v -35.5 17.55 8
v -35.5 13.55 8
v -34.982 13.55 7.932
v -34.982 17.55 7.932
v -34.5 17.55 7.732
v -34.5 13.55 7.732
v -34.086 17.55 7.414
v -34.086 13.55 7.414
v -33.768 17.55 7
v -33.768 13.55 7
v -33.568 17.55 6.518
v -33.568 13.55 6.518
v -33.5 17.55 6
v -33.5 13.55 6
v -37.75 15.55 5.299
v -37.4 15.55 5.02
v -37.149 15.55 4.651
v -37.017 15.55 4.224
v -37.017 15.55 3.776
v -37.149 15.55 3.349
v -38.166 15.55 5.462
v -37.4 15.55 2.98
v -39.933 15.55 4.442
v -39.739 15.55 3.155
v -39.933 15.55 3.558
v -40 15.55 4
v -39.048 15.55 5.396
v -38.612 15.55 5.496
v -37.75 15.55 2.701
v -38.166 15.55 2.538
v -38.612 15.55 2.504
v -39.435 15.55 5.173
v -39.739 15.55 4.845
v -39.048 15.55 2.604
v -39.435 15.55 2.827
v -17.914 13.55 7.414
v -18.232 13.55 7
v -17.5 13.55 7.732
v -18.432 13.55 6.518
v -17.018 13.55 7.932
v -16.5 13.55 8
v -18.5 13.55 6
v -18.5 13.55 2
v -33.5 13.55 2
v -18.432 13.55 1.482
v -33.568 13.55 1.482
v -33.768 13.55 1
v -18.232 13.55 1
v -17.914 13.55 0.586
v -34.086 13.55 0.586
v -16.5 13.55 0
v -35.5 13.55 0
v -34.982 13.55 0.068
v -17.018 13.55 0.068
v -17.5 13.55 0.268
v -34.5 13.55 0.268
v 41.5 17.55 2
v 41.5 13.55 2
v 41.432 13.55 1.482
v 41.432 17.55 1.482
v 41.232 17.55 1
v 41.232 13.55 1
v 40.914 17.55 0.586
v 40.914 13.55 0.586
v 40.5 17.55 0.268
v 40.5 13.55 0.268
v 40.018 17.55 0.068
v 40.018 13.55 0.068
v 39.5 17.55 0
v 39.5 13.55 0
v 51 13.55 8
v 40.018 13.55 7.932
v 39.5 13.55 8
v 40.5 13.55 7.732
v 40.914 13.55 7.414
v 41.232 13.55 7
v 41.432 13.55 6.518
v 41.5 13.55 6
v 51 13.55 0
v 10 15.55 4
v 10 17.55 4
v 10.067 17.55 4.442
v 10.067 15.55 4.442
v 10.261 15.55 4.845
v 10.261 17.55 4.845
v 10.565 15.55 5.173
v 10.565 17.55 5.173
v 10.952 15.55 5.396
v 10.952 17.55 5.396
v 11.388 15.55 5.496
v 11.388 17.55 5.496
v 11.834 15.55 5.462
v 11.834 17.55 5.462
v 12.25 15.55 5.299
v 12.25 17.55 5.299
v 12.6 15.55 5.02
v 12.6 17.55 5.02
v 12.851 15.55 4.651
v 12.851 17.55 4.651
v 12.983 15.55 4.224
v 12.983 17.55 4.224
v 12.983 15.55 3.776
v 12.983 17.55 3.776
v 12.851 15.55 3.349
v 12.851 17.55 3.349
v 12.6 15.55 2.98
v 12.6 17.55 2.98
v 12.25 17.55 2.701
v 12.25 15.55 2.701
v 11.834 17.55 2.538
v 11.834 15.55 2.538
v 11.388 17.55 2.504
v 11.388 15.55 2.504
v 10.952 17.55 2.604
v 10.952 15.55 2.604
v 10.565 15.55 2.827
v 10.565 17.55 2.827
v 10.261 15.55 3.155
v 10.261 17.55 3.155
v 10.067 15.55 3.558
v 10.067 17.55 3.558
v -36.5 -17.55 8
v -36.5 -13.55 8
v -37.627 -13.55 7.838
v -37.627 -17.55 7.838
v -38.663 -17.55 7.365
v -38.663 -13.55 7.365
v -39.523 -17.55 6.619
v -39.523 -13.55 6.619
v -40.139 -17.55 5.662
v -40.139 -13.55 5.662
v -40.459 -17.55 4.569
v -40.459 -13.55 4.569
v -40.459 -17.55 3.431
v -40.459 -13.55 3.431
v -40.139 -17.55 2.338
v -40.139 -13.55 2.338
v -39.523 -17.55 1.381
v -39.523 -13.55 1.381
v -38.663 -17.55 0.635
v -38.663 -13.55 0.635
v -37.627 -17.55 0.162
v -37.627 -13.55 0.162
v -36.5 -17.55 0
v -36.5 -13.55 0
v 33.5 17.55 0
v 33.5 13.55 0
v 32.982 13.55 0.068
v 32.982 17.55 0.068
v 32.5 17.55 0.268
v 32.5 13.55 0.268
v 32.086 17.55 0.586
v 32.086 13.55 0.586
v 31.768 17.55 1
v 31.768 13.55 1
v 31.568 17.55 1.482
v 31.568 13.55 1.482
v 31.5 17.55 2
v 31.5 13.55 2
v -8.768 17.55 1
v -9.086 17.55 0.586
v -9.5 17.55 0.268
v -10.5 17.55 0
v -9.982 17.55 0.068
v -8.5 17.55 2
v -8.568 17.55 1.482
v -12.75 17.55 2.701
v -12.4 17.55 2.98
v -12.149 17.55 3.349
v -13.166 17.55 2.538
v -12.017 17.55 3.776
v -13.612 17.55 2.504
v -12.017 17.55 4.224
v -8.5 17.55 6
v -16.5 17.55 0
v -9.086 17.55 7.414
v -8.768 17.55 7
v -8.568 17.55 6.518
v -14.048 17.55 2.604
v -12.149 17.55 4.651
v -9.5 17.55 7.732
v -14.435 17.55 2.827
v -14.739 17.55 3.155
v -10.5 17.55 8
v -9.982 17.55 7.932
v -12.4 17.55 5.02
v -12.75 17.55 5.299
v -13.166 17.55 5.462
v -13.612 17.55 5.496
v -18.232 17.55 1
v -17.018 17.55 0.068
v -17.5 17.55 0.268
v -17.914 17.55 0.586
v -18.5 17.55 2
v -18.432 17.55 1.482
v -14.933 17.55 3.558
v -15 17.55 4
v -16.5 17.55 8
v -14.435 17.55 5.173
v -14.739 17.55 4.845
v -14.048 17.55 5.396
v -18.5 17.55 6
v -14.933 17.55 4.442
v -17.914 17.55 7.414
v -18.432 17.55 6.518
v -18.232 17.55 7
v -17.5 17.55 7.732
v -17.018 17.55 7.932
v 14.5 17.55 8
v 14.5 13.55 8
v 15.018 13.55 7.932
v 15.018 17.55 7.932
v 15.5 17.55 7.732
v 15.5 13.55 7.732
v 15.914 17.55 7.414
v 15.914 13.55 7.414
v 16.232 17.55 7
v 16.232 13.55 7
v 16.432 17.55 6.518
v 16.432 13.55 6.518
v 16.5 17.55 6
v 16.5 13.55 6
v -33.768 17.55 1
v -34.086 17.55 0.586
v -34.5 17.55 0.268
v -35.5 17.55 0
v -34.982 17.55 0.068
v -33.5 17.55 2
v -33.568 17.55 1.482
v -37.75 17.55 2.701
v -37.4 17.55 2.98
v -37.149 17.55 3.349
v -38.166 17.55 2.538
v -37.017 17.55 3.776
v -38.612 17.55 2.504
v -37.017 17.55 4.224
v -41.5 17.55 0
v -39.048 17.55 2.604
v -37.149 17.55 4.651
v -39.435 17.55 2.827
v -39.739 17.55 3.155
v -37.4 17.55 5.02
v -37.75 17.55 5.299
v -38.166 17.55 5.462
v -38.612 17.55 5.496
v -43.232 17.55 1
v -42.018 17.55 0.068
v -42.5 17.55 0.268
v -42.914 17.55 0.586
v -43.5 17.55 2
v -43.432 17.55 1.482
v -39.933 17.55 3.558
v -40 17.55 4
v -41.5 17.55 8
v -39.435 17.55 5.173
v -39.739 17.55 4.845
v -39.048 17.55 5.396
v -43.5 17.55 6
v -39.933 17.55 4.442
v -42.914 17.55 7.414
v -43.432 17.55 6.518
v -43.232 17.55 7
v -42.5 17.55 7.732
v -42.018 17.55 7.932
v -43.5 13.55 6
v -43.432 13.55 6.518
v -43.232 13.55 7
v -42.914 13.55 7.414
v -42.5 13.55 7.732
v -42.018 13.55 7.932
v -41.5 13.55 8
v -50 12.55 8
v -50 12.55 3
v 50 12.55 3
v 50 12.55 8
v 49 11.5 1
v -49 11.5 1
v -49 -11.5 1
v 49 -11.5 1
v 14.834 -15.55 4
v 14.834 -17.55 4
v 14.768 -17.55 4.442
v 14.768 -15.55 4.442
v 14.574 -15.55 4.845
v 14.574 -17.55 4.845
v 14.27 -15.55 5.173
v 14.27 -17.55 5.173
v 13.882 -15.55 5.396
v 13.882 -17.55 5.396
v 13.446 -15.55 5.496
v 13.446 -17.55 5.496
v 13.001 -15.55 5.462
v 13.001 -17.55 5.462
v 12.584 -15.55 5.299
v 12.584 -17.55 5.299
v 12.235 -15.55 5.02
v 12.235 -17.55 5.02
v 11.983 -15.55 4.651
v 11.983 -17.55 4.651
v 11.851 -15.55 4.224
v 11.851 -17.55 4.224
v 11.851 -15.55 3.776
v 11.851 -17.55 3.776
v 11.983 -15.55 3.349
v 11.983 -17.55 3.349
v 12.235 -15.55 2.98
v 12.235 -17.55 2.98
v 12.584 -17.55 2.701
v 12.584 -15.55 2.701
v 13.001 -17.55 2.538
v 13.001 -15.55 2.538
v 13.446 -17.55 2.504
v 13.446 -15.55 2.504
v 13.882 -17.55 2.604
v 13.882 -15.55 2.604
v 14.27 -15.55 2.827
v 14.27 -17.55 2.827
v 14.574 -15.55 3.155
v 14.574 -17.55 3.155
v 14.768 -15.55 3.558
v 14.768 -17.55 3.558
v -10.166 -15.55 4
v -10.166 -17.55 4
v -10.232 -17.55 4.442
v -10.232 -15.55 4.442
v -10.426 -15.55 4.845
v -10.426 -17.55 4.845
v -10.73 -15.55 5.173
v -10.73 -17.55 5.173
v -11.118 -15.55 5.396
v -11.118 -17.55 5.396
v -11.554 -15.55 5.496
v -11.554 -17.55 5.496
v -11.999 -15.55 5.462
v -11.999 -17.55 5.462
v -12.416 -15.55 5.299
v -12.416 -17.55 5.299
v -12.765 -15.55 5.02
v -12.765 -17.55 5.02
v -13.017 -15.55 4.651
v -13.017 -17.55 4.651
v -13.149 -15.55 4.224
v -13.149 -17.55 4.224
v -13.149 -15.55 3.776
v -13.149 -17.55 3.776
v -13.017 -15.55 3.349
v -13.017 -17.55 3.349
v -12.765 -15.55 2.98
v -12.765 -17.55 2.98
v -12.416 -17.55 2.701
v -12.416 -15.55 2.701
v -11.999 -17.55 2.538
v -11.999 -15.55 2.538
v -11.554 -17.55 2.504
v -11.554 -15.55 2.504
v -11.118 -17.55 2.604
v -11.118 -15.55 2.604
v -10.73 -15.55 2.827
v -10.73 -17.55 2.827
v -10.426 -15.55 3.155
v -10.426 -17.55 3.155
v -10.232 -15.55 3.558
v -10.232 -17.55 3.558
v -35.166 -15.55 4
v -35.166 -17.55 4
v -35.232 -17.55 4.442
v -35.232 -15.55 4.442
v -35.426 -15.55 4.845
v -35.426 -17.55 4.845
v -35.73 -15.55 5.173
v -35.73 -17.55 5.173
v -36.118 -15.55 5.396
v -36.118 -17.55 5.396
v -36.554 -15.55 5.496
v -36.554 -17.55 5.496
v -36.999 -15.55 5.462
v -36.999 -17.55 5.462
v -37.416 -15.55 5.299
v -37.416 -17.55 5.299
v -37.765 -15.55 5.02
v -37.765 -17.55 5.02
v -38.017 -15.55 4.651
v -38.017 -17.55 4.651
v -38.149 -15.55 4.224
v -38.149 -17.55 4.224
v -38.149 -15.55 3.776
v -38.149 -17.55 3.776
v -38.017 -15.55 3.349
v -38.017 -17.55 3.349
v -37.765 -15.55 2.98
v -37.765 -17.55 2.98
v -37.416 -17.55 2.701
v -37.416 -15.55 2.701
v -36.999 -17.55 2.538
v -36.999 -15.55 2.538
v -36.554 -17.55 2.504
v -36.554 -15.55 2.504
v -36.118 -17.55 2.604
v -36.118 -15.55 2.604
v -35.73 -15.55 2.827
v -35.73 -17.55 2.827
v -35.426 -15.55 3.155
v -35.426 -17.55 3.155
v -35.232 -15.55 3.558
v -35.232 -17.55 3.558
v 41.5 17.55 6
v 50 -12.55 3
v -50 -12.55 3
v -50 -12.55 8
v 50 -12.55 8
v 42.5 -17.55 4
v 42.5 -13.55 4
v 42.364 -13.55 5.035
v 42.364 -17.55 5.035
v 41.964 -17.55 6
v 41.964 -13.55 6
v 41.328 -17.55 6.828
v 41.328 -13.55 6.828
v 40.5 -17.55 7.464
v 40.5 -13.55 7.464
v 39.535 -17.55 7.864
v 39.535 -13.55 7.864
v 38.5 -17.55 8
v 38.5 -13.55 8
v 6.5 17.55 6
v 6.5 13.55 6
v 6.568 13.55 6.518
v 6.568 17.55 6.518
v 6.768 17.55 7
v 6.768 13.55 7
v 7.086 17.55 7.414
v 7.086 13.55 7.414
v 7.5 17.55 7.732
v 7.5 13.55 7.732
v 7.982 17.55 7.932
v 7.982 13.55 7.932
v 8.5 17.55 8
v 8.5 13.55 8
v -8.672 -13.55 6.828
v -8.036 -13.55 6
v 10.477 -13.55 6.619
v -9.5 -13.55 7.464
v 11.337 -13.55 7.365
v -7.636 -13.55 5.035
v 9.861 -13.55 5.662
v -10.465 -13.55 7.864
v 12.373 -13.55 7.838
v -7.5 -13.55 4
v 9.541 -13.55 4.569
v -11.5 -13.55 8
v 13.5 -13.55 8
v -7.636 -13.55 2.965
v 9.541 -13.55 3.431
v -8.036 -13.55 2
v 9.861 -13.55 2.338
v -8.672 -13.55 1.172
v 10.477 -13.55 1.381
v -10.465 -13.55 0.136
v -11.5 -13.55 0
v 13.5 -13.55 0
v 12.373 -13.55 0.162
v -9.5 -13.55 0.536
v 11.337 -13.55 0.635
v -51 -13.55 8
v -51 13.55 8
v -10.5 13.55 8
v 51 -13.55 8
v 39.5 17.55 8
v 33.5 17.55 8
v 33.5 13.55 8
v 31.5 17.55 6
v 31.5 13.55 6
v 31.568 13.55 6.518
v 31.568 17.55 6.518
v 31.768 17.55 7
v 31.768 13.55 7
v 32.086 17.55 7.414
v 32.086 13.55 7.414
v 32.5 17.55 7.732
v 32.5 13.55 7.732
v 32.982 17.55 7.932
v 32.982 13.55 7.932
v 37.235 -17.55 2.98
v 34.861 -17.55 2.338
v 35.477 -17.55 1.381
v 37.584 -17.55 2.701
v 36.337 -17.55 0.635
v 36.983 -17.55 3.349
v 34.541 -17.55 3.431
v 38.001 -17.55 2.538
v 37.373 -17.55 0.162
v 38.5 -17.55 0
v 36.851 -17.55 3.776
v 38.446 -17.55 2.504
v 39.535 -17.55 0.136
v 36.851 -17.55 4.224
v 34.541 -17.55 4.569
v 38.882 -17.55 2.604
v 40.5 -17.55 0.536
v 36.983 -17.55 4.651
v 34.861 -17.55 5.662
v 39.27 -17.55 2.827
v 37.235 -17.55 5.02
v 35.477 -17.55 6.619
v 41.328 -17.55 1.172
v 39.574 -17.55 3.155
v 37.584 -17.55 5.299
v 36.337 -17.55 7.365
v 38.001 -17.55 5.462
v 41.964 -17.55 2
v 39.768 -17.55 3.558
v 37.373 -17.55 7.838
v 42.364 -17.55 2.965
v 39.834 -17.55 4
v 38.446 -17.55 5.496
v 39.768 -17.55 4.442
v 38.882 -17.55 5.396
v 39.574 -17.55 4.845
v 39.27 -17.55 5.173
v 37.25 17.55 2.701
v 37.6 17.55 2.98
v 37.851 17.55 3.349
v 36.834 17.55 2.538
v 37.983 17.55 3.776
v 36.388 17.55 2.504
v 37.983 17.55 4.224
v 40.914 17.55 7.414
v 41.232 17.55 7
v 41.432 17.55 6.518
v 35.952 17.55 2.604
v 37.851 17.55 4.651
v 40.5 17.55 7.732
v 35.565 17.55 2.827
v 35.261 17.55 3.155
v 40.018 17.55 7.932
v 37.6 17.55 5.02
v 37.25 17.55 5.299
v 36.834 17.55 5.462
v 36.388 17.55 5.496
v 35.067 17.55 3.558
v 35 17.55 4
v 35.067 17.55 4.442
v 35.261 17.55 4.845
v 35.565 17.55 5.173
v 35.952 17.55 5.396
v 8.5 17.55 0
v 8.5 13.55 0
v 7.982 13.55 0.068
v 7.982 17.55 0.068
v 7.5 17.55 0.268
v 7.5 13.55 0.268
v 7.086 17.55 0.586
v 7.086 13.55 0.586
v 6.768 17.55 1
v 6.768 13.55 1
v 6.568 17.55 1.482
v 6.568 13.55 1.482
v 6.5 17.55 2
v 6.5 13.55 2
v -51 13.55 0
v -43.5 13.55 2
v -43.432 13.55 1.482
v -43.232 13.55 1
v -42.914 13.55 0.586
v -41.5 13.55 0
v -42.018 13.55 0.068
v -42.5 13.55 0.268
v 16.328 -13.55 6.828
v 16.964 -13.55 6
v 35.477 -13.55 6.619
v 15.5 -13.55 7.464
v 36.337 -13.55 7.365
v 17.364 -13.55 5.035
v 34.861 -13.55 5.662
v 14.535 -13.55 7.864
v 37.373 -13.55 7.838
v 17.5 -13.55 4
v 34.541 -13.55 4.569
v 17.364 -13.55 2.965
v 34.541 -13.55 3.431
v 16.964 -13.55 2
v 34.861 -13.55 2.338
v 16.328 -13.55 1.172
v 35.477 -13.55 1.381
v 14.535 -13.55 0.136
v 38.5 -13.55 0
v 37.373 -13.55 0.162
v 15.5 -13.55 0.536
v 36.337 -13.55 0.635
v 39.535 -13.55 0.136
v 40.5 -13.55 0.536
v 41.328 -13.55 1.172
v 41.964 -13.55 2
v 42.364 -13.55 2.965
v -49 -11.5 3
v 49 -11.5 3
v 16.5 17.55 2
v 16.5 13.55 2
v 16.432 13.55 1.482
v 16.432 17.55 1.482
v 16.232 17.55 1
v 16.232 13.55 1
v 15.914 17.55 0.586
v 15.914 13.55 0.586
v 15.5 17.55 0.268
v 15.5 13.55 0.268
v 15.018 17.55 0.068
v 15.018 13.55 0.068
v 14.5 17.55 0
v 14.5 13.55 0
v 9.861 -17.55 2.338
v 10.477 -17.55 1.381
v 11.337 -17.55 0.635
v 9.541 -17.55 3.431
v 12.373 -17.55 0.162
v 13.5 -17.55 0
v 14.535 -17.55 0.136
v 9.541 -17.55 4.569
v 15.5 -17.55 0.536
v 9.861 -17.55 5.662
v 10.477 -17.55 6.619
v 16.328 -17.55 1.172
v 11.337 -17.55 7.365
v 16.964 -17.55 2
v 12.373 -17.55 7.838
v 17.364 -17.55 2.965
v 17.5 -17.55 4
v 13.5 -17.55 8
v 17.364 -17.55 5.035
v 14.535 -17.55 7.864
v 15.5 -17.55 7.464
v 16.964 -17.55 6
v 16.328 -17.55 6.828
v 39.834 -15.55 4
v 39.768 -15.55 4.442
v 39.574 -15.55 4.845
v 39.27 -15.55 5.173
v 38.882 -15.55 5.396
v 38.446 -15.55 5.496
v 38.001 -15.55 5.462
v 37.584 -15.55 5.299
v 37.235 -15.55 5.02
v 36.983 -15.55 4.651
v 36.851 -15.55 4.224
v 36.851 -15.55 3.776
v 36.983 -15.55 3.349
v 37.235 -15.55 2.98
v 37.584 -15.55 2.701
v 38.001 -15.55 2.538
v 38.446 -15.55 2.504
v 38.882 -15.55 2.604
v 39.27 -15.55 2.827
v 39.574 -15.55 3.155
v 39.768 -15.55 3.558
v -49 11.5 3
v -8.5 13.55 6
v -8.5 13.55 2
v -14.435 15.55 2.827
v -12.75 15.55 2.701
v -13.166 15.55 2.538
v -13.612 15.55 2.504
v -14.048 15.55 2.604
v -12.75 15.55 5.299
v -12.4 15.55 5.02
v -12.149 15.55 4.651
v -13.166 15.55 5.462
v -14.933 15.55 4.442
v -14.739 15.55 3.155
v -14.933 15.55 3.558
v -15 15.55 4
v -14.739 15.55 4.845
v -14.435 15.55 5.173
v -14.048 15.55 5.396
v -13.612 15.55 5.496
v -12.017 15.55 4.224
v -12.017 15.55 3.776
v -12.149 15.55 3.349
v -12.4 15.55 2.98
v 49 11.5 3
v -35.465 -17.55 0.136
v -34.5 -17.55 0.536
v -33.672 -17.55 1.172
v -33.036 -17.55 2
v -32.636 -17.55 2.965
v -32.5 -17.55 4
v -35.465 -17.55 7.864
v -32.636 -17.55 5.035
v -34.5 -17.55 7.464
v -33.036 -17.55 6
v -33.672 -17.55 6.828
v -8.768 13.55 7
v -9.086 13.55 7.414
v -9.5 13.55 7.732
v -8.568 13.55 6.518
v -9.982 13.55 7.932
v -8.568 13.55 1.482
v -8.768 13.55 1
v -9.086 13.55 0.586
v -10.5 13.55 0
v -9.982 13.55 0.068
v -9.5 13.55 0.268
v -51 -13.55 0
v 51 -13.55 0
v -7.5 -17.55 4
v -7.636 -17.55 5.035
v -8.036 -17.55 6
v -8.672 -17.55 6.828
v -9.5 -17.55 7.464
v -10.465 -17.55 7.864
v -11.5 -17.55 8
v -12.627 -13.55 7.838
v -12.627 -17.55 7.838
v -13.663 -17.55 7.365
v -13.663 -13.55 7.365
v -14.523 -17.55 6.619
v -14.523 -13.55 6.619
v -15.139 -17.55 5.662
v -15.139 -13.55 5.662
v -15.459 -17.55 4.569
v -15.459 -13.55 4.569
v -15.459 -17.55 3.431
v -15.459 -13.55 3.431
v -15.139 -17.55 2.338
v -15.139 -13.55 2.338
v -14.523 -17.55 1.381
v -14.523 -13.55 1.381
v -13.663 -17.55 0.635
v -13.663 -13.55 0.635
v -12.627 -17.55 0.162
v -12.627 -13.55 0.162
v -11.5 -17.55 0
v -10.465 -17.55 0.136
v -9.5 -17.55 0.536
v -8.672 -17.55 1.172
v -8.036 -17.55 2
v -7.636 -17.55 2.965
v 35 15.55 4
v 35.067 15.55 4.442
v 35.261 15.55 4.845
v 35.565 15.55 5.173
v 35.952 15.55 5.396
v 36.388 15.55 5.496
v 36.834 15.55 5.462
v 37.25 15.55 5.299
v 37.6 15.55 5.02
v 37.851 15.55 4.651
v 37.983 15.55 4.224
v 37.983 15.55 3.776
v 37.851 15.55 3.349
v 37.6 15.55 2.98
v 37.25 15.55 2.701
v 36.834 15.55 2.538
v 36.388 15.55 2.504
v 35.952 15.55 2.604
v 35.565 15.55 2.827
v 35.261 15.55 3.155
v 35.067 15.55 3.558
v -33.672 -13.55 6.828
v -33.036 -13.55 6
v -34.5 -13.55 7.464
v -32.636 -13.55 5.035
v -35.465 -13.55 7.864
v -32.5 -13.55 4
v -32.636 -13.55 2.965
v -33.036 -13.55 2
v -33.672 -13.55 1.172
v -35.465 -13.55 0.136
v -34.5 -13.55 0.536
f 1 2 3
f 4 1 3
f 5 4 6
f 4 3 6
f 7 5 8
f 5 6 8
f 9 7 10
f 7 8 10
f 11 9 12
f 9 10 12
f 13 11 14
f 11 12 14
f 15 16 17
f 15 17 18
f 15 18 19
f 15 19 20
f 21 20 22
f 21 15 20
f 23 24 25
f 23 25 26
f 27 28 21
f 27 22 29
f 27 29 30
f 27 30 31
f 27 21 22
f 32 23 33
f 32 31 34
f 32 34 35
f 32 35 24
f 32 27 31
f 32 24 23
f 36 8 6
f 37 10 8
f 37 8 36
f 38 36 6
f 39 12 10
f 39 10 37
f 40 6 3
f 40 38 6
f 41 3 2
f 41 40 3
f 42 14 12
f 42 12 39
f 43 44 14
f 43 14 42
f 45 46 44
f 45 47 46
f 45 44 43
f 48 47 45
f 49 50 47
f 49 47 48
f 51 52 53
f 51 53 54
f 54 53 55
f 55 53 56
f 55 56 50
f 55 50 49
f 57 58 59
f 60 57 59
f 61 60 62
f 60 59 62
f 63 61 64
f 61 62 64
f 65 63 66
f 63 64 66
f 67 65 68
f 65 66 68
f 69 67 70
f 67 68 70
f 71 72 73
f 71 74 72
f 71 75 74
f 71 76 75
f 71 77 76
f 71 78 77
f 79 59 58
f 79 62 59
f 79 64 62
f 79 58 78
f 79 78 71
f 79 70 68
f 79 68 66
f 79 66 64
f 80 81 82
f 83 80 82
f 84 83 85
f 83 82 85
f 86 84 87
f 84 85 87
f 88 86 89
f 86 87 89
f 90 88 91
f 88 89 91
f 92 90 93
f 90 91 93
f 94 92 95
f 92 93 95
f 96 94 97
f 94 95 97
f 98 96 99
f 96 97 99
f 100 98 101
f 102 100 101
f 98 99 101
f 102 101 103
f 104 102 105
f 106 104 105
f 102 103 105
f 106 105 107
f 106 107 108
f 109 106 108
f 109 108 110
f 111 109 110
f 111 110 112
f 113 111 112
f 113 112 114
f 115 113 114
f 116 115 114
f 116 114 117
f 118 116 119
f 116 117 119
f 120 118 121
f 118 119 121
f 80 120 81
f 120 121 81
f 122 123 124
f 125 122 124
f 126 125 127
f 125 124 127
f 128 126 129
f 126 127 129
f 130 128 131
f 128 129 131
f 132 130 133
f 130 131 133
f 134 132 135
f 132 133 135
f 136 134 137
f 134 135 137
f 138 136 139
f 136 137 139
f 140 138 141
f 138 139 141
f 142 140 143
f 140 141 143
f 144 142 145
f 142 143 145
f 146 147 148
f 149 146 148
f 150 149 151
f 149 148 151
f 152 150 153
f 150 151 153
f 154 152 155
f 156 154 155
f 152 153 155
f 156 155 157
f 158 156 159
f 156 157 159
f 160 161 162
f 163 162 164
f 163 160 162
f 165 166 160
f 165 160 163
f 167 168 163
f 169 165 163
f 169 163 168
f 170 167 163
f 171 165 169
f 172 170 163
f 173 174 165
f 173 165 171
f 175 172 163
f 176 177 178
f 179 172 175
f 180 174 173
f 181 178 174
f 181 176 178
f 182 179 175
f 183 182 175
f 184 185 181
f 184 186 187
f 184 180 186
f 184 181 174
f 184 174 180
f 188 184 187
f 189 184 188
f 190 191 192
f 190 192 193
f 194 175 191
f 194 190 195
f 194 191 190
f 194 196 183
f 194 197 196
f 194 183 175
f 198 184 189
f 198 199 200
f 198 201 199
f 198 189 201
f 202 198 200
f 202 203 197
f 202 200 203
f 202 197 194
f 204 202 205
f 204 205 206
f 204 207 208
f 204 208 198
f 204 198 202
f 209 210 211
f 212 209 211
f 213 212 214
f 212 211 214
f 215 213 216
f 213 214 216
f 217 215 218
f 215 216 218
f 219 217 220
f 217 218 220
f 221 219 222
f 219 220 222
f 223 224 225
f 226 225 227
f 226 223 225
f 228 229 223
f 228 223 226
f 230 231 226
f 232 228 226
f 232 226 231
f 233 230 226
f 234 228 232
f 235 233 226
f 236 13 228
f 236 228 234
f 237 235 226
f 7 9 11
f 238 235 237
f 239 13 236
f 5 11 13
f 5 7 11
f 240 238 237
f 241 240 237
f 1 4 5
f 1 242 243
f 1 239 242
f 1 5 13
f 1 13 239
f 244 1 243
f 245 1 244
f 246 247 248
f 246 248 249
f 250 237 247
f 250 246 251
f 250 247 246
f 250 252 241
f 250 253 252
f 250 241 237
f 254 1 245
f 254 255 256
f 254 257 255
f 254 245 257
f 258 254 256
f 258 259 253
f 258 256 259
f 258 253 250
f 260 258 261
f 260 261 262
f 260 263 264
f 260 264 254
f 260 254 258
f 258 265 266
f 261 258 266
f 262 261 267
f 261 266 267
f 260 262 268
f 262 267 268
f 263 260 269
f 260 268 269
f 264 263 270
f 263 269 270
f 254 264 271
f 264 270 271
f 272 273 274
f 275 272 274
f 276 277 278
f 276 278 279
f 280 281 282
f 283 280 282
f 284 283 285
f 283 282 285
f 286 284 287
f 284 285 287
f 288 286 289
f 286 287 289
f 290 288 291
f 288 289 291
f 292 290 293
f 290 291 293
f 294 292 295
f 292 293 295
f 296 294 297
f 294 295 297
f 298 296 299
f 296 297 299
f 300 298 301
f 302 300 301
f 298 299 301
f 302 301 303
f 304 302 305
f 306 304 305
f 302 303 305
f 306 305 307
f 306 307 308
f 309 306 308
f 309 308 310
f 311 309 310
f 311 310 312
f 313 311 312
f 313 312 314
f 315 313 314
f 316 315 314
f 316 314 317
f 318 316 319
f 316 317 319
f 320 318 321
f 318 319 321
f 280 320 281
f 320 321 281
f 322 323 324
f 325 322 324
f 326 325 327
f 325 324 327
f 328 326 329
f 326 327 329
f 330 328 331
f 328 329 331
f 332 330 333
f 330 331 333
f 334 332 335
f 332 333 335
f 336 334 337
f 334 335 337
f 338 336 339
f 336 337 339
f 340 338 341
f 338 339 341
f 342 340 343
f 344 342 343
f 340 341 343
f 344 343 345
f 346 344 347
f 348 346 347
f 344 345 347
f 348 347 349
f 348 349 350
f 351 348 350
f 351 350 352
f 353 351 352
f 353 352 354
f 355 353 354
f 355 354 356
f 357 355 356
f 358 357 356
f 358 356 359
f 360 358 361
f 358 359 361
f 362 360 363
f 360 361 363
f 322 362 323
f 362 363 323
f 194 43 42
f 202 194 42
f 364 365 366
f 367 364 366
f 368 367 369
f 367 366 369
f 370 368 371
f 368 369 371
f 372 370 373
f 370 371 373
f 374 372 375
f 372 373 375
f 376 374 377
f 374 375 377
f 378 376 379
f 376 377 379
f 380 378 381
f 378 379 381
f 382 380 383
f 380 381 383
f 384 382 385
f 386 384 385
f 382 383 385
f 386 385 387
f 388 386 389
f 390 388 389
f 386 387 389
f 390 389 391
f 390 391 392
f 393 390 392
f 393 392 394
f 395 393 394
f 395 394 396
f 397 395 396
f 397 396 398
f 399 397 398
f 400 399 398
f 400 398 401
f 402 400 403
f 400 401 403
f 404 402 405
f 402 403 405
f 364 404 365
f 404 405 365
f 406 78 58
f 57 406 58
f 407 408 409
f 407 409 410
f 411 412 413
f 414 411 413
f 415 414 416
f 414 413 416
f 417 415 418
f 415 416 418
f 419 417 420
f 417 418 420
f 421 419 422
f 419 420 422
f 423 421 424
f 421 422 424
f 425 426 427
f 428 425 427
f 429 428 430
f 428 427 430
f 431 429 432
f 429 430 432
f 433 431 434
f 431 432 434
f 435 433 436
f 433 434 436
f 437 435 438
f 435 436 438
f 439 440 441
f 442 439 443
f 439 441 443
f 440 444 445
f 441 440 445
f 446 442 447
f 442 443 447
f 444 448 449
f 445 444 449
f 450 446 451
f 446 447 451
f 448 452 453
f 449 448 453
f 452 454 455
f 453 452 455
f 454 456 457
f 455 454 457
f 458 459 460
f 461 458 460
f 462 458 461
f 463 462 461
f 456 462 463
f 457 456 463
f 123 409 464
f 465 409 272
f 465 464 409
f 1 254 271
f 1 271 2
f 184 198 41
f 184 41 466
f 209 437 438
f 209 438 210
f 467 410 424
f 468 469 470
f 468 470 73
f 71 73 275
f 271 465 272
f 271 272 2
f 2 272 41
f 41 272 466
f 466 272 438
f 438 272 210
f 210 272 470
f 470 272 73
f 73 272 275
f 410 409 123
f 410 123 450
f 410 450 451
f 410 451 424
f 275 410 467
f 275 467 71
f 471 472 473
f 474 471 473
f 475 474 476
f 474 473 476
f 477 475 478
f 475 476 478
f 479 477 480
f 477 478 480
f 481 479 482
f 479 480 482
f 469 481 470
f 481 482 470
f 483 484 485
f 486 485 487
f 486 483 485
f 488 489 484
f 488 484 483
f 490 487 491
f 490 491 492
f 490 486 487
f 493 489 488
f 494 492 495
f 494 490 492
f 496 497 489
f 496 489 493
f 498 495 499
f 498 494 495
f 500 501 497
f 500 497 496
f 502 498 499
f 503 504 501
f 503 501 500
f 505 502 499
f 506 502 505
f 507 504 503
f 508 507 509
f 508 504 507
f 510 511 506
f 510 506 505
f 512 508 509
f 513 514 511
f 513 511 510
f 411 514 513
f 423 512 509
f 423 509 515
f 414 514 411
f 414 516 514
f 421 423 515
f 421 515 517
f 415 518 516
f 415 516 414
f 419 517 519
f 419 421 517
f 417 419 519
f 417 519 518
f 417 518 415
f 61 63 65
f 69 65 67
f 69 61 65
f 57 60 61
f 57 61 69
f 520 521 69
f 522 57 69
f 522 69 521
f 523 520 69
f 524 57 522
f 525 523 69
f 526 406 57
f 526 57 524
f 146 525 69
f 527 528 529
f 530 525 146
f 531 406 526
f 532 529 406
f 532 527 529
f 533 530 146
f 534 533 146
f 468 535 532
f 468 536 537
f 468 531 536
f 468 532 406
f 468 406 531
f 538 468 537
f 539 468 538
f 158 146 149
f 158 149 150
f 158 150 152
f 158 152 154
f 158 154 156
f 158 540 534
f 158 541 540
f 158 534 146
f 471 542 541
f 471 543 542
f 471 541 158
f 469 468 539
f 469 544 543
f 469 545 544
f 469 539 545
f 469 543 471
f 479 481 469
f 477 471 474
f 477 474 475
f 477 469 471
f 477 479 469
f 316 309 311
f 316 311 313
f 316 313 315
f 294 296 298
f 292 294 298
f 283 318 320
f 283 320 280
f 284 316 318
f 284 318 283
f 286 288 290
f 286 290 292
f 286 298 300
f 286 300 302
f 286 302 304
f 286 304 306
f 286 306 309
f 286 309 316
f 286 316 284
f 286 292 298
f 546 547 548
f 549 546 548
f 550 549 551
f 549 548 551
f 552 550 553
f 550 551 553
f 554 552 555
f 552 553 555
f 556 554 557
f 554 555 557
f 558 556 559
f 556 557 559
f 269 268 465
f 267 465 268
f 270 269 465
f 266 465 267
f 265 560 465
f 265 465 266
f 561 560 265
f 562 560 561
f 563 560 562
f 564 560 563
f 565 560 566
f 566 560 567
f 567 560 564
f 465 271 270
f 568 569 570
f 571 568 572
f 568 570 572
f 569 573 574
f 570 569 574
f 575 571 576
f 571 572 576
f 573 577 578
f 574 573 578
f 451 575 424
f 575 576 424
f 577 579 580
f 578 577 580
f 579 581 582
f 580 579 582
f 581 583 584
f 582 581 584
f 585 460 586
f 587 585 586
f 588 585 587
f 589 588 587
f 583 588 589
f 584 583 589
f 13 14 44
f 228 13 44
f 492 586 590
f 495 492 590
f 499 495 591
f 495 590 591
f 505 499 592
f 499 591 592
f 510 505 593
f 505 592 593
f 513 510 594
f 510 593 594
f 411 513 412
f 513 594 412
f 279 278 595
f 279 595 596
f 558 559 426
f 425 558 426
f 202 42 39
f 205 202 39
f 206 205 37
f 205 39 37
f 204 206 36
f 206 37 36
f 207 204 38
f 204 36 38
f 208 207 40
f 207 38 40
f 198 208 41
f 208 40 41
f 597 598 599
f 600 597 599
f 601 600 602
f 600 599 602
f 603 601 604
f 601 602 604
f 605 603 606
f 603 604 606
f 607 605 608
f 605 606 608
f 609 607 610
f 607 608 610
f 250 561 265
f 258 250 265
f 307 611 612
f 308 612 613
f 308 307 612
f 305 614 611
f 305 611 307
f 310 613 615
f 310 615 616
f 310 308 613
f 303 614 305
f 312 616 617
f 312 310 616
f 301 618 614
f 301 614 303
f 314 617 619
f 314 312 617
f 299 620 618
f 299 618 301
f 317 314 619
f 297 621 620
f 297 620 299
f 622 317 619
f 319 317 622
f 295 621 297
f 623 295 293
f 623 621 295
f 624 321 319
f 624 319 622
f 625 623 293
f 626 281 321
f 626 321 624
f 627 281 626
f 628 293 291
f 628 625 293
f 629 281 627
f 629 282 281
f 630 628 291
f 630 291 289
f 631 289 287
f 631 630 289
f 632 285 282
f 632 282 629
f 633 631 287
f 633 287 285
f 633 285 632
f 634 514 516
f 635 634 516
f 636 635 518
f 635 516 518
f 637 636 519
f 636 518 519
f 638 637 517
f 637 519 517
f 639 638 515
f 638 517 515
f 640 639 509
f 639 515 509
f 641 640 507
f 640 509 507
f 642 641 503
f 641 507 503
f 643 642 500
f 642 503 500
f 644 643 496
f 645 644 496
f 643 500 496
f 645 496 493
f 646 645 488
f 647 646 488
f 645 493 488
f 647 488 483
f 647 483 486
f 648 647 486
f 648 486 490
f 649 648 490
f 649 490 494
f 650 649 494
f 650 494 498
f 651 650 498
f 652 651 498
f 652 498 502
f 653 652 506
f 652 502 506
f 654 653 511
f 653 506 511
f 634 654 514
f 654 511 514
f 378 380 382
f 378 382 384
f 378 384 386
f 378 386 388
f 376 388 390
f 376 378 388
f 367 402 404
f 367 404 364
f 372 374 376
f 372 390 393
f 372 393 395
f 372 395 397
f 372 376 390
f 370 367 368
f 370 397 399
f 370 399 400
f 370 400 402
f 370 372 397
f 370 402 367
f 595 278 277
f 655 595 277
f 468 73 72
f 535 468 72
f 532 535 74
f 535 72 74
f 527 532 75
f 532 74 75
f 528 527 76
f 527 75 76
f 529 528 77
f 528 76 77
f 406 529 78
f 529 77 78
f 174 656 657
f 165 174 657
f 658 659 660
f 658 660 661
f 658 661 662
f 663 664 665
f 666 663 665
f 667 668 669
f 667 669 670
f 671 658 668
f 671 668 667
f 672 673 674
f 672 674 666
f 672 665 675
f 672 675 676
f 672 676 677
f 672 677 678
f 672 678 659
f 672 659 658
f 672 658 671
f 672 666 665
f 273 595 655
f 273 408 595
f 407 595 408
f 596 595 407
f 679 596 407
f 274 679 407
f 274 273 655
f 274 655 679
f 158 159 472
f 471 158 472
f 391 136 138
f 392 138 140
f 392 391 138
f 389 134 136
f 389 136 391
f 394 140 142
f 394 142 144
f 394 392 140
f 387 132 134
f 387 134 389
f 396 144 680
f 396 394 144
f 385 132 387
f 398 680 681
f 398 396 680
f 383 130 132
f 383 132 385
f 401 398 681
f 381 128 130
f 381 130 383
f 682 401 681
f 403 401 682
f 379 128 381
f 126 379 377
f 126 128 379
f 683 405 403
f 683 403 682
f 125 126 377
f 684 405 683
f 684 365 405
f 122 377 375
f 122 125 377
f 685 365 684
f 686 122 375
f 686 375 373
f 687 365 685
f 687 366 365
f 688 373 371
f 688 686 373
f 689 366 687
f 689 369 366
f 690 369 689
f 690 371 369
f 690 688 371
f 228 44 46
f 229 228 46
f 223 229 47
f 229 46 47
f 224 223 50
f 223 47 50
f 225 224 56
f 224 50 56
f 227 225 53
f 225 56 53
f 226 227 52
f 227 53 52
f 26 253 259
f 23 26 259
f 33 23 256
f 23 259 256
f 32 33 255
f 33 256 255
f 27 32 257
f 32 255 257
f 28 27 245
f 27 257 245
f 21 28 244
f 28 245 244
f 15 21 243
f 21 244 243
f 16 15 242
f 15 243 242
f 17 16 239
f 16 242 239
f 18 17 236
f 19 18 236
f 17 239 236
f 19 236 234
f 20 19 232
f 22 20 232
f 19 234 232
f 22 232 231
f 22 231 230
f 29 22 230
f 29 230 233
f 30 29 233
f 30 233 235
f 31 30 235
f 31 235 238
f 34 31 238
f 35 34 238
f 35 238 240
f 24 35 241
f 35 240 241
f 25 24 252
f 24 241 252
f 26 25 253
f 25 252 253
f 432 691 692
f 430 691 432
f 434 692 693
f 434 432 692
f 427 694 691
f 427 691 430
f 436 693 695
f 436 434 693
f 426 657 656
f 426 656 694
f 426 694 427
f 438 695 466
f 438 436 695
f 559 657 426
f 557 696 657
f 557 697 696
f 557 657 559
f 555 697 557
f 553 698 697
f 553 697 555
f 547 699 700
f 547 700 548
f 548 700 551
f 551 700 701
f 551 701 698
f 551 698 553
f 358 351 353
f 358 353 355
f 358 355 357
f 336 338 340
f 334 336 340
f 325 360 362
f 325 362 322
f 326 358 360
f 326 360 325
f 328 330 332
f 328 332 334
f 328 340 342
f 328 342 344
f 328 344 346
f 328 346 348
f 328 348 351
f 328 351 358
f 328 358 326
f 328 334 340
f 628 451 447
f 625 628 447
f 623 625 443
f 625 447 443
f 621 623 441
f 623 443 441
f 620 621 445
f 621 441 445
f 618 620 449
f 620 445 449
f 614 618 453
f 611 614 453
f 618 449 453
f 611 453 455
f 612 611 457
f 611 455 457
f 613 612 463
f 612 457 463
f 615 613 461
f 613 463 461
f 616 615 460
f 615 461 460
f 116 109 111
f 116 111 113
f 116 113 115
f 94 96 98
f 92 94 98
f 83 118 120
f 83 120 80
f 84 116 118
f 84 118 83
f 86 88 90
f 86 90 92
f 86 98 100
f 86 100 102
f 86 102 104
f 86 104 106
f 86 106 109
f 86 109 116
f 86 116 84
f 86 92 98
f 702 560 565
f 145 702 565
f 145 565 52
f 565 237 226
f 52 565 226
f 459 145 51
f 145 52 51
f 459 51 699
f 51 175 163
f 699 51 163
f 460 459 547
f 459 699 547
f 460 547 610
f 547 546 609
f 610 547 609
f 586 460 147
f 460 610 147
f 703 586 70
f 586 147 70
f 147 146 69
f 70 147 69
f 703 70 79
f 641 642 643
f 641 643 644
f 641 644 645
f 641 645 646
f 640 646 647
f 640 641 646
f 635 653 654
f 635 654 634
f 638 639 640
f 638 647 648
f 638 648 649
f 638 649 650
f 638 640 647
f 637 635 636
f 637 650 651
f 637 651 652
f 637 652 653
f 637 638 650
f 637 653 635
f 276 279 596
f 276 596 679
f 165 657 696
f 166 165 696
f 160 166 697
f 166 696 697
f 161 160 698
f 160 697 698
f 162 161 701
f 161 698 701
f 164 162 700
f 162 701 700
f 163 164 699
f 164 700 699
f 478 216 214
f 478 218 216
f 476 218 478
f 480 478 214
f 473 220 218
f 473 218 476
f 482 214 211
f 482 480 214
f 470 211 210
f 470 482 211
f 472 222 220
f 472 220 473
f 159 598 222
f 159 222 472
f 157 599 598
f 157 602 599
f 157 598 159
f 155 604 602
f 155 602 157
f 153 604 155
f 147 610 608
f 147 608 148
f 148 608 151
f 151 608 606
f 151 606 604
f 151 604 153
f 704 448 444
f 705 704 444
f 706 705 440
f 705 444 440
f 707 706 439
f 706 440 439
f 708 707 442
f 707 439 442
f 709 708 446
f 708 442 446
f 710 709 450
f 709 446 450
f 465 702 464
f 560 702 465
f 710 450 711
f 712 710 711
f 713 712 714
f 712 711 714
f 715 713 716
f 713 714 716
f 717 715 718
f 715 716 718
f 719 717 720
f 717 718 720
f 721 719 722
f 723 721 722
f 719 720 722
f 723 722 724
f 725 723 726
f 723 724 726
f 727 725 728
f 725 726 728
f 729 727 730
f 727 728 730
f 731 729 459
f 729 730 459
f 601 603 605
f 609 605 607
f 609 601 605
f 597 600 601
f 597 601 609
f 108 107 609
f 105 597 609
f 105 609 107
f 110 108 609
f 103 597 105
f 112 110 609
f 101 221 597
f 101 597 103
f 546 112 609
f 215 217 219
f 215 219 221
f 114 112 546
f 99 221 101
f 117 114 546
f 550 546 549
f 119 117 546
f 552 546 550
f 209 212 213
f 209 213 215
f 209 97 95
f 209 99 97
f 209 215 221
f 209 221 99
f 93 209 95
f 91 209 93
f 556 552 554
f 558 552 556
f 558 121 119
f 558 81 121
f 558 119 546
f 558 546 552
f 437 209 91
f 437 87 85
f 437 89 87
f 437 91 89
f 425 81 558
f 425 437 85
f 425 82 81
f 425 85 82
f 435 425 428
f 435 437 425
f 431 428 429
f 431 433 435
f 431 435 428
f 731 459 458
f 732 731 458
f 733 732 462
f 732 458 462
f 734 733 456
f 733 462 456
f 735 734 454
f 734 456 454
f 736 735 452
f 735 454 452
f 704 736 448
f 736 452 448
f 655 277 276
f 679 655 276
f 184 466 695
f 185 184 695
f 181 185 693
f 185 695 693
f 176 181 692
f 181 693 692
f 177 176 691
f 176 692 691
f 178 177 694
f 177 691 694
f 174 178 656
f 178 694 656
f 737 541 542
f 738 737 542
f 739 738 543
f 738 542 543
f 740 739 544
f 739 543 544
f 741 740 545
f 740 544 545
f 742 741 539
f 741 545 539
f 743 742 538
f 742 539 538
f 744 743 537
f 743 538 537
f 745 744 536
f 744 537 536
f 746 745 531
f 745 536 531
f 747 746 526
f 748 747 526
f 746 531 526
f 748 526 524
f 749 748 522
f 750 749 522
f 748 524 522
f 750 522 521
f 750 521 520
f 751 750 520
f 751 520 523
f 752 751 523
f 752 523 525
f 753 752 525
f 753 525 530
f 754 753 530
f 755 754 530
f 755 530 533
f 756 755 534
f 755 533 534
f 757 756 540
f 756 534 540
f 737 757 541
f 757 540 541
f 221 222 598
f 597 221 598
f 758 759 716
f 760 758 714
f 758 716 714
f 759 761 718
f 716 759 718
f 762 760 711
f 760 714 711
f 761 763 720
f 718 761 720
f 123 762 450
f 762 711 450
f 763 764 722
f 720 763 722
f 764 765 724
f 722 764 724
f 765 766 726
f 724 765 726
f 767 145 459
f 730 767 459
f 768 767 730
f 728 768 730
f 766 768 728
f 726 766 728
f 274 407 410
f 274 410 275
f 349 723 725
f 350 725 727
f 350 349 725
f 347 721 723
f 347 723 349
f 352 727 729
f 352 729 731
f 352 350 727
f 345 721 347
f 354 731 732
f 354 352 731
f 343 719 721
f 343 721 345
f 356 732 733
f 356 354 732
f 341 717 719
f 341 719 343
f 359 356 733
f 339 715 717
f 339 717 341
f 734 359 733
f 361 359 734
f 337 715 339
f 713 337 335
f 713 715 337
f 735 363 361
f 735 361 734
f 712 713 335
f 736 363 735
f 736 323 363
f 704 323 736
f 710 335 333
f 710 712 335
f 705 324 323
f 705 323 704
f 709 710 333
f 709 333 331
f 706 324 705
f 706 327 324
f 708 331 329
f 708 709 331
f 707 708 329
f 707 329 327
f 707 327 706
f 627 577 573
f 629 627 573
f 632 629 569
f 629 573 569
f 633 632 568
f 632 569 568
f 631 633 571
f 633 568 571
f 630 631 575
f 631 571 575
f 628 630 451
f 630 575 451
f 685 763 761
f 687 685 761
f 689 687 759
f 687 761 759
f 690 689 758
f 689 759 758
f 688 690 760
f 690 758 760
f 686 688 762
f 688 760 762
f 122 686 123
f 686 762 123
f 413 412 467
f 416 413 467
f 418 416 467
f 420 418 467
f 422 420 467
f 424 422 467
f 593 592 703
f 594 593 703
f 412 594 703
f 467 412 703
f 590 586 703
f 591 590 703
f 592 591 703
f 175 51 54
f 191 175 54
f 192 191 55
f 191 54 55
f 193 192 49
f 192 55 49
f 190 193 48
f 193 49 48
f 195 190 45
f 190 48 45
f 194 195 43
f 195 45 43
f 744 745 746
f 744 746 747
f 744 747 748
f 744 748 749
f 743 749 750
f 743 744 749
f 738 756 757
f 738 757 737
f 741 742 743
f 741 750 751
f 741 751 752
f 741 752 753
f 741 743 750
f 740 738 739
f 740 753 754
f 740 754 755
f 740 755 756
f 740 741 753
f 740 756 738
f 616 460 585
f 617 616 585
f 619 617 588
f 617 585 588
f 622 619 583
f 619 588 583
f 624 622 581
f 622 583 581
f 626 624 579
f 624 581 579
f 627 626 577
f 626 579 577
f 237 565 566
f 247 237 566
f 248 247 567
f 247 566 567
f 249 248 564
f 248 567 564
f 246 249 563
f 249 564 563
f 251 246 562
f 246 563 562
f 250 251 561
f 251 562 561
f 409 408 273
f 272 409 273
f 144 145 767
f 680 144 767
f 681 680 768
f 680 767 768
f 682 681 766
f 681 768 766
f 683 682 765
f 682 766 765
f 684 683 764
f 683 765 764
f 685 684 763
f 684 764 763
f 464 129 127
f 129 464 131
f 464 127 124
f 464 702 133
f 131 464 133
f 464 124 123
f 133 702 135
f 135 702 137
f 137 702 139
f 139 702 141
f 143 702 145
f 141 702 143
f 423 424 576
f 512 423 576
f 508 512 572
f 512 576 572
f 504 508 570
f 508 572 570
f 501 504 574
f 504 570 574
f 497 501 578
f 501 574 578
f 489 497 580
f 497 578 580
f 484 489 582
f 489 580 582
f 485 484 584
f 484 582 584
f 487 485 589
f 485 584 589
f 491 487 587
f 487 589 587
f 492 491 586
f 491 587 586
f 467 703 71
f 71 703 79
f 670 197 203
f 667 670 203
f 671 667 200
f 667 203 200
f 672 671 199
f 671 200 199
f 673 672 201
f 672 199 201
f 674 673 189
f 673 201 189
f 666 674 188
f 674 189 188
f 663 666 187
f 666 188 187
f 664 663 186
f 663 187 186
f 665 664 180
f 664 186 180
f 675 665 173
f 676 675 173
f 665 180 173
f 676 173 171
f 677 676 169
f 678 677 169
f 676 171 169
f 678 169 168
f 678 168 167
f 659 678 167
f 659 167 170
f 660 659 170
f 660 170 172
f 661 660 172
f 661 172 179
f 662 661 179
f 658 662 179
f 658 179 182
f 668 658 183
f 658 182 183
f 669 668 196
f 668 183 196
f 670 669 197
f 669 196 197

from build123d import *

# Parameters (mm, degrees)
F0_W      = 102
F0_H      = 27.1
F0_W_2    = 100
F0_H_2    = 25.1
F1_DEPTH  = 8
F2_DEPTH  = 1
F3_W      = 100
F3_H      = 25.1
F3_W_2    = 98
F3_H_2    = 23
F4_DEPTH  = 2
F6_DEPTH  = 4
F7_R      = 1.5
F8_DEPTH  = 2
F10_DEPTH = 4
F11_R     = 1.5
F12_DEPTH = 2


# Not quite as in the source:
# - a feature names something its author has since deleted; it is built from what else it names


with BuildPart() as f1:
    # F0 (on Top) → F1 (new body)
    with BuildSketch(Plane.XY):
        Rectangle(F0_W, F0_H)
        Rectangle(F0_W_2, F0_H_2, mode=Mode.SUBTRACT)
    extrude(amount=F1_DEPTH)

    # F0 (on Top) → F2 (join)
    with BuildSketch(Plane.XY):
        Rectangle(F0_W_2, F0_H_2)
    extrude(amount=F2_DEPTH)

    # F3 (on face) → F4 (join)
    with BuildSketch(Plane.XY.offset(1)):
        Rectangle(F3_W, F3_H)
        Rectangle(F3_W_2, F3_H_2, mode=Mode.SUBTRACT)
    extrude(amount=F4_DEPTH)

    # F5 (on face) → F6 (join)
    with BuildSketch(Plane.XZ.offset(13.55)):
        with BuildLine():
            ThreePointArc((-36.5, 0), (-33.6715728753, 1.1715728753), (-32.5, 4))
            ThreePointArc((-32.5, 4), (-33.6715728968, 6.8284271463), (-36.5000000611, 8))
            ThreePointArc((-36.5000000611, 8), (-40.5, 3.9999999695), (-36.5, 0))
        make_face()
        with BuildLine():
            ThreePointArc((-7.5, 4), (-8.6715728753, 6.8284271247), (-11.5, 8))
            ThreePointArc((-11.5, 8), (-15.5, 4), (-11.5, 0))
            ThreePointArc((-11.5, 0), (-8.6715728753, 1.1715728753), (-7.5, 4))
        make_face()
        with BuildLine():
            ThreePointArc((17.5, 4), (16.3284271247, 6.8284271247), (13.5, 8))
            ThreePointArc((13.5, 8), (9.5, 4.0000000201), (13.4999999598, 0))
            ThreePointArc((13.4999999598, 0), (16.3284271105, 1.171572861), (17.5, 4))
        make_face()
        with BuildLine():
            ThreePointArc((42.5, 4), (41.3284271247, 6.8284271247), (38.5, 8))
            ThreePointArc((38.5, 8), (34.5, 4.0000000325), (38.499999935, 0))
            ThreePointArc((38.499999935, 0), (41.3284271017, 1.1715728523), (42.5, 4))
        make_face()
    extrude(amount=F6_DEPTH)

    # F7 (on face) → F8 (cut)
    with BuildSketch(Plane.XZ.offset(17.55)):
        with Locations((-36.6656929255, 4)):
            Circle(F7_R)
        with Locations((-11.6656929255, 4)):
            Circle(F7_R)
        with Locations((13.3343070745, 4)):
            Circle(F7_R)
        with Locations((38.3343070745, 4)):
            Circle(F7_R)
    extrude(amount=-F8_DEPTH, mode=Mode.SUBTRACT)

    # F9 (on face) → F10 (join)
    with BuildSketch(Plane(origin=(0, 13.55, 0), x_dir=(-1, 0, 0), z_dir=(0, 1, 0))):
        with BuildLine():
            Line((-39.5, 0), (-33.5, 0))
            ThreePointArc((-33.5, 0), (-32.0857864376, 0.5857864376), (-31.5, 2))
            Line((-31.5, 2), (-31.5, 6))
            ThreePointArc((-31.5, 6), (-32.0857864376, 7.4142135624), (-33.5, 8))
            Line((-33.5, 8), (-39.5, 8))
            ThreePointArc((-39.5, 8), (-40.9142135624, 7.4142135624), (-41.5, 6))
            Line((-41.5, 6), (-41.5, 2))
            ThreePointArc((-41.5, 2), (-40.9142135624, 0.5857864376), (-39.5, 0))
        make_face()
        with BuildLine():
            ThreePointArc((-16.5, 2), (-15.9142135624, 0.5857864376), (-14.5, 0))
            Line((-14.5, 0), (-8.5, 0))
            ThreePointArc((-8.5, 0), (-7.0857864376, 0.5857864376), (-6.5, 2))
            Line((-6.5, 2), (-6.5, 6))
            ThreePointArc((-6.5, 6), (-7.0857864376, 7.4142135624), (-8.5, 8))
            Line((-8.5, 8), (-14.5, 8))
            ThreePointArc((-14.5, 8), (-15.9142135624, 7.4142135624), (-16.5, 6))
            Line((-16.5, 6), (-16.5, 2))
        make_face()
        with BuildLine():
            ThreePointArc((8.5, 2), (9.0857864376, 0.5857864376), (10.5, 0))
            Line((10.5, 0), (16.5, 0))
            ThreePointArc((16.5, 0), (17.9142135624, 0.5857864376), (18.5, 2))
            Line((18.5, 2), (18.5, 6))
            ThreePointArc((18.5, 6), (17.9142135624, 7.4142135624), (16.5, 8))
            Line((16.5, 8), (10.5, 8))
            ThreePointArc((10.5, 8), (9.0857864376, 7.4142135624), (8.5, 6))
            Line((8.5, 6), (8.5, 2))
        make_face()
        with BuildLine():
            ThreePointArc((33.5, 2), (34.0857864376, 0.5857864376), (35.5, 0))
            Line((35.5, 0), (41.5, 0))
            ThreePointArc((41.5, 0), (42.9142135624, 0.5857864376), (43.5, 2))
            Line((43.5, 2), (43.5, 6))
            ThreePointArc((43.5, 6), (42.9142135624, 7.4142135624), (41.5, 8))
            Line((41.5, 8), (35.5, 8))
            ThreePointArc((35.5, 8), (34.0857864376, 7.4142135624), (33.5, 6))
            Line((33.5, 6), (33.5, 2))
        make_face()
    extrude(amount=F10_DEPTH)

    # F11 (on face) → F12 (cut)
    with BuildSketch(Plane(origin=(0, 17.55, 0), x_dir=(-1, 0, 0), z_dir=(0, 1, 0))):
        with Locations((-36.5, 4)):
            Circle(F11_R)
        with Locations((-11.5, 4)):
            Circle(F11_R)
        with Locations((13.5, 4)):
            Circle(F11_R)
        with Locations((38.5, 4)):
            Circle(F11_R)
    extrude(amount=-F12_DEPTH, mode=Mode.SUBTRACT)


solid = f1.part
